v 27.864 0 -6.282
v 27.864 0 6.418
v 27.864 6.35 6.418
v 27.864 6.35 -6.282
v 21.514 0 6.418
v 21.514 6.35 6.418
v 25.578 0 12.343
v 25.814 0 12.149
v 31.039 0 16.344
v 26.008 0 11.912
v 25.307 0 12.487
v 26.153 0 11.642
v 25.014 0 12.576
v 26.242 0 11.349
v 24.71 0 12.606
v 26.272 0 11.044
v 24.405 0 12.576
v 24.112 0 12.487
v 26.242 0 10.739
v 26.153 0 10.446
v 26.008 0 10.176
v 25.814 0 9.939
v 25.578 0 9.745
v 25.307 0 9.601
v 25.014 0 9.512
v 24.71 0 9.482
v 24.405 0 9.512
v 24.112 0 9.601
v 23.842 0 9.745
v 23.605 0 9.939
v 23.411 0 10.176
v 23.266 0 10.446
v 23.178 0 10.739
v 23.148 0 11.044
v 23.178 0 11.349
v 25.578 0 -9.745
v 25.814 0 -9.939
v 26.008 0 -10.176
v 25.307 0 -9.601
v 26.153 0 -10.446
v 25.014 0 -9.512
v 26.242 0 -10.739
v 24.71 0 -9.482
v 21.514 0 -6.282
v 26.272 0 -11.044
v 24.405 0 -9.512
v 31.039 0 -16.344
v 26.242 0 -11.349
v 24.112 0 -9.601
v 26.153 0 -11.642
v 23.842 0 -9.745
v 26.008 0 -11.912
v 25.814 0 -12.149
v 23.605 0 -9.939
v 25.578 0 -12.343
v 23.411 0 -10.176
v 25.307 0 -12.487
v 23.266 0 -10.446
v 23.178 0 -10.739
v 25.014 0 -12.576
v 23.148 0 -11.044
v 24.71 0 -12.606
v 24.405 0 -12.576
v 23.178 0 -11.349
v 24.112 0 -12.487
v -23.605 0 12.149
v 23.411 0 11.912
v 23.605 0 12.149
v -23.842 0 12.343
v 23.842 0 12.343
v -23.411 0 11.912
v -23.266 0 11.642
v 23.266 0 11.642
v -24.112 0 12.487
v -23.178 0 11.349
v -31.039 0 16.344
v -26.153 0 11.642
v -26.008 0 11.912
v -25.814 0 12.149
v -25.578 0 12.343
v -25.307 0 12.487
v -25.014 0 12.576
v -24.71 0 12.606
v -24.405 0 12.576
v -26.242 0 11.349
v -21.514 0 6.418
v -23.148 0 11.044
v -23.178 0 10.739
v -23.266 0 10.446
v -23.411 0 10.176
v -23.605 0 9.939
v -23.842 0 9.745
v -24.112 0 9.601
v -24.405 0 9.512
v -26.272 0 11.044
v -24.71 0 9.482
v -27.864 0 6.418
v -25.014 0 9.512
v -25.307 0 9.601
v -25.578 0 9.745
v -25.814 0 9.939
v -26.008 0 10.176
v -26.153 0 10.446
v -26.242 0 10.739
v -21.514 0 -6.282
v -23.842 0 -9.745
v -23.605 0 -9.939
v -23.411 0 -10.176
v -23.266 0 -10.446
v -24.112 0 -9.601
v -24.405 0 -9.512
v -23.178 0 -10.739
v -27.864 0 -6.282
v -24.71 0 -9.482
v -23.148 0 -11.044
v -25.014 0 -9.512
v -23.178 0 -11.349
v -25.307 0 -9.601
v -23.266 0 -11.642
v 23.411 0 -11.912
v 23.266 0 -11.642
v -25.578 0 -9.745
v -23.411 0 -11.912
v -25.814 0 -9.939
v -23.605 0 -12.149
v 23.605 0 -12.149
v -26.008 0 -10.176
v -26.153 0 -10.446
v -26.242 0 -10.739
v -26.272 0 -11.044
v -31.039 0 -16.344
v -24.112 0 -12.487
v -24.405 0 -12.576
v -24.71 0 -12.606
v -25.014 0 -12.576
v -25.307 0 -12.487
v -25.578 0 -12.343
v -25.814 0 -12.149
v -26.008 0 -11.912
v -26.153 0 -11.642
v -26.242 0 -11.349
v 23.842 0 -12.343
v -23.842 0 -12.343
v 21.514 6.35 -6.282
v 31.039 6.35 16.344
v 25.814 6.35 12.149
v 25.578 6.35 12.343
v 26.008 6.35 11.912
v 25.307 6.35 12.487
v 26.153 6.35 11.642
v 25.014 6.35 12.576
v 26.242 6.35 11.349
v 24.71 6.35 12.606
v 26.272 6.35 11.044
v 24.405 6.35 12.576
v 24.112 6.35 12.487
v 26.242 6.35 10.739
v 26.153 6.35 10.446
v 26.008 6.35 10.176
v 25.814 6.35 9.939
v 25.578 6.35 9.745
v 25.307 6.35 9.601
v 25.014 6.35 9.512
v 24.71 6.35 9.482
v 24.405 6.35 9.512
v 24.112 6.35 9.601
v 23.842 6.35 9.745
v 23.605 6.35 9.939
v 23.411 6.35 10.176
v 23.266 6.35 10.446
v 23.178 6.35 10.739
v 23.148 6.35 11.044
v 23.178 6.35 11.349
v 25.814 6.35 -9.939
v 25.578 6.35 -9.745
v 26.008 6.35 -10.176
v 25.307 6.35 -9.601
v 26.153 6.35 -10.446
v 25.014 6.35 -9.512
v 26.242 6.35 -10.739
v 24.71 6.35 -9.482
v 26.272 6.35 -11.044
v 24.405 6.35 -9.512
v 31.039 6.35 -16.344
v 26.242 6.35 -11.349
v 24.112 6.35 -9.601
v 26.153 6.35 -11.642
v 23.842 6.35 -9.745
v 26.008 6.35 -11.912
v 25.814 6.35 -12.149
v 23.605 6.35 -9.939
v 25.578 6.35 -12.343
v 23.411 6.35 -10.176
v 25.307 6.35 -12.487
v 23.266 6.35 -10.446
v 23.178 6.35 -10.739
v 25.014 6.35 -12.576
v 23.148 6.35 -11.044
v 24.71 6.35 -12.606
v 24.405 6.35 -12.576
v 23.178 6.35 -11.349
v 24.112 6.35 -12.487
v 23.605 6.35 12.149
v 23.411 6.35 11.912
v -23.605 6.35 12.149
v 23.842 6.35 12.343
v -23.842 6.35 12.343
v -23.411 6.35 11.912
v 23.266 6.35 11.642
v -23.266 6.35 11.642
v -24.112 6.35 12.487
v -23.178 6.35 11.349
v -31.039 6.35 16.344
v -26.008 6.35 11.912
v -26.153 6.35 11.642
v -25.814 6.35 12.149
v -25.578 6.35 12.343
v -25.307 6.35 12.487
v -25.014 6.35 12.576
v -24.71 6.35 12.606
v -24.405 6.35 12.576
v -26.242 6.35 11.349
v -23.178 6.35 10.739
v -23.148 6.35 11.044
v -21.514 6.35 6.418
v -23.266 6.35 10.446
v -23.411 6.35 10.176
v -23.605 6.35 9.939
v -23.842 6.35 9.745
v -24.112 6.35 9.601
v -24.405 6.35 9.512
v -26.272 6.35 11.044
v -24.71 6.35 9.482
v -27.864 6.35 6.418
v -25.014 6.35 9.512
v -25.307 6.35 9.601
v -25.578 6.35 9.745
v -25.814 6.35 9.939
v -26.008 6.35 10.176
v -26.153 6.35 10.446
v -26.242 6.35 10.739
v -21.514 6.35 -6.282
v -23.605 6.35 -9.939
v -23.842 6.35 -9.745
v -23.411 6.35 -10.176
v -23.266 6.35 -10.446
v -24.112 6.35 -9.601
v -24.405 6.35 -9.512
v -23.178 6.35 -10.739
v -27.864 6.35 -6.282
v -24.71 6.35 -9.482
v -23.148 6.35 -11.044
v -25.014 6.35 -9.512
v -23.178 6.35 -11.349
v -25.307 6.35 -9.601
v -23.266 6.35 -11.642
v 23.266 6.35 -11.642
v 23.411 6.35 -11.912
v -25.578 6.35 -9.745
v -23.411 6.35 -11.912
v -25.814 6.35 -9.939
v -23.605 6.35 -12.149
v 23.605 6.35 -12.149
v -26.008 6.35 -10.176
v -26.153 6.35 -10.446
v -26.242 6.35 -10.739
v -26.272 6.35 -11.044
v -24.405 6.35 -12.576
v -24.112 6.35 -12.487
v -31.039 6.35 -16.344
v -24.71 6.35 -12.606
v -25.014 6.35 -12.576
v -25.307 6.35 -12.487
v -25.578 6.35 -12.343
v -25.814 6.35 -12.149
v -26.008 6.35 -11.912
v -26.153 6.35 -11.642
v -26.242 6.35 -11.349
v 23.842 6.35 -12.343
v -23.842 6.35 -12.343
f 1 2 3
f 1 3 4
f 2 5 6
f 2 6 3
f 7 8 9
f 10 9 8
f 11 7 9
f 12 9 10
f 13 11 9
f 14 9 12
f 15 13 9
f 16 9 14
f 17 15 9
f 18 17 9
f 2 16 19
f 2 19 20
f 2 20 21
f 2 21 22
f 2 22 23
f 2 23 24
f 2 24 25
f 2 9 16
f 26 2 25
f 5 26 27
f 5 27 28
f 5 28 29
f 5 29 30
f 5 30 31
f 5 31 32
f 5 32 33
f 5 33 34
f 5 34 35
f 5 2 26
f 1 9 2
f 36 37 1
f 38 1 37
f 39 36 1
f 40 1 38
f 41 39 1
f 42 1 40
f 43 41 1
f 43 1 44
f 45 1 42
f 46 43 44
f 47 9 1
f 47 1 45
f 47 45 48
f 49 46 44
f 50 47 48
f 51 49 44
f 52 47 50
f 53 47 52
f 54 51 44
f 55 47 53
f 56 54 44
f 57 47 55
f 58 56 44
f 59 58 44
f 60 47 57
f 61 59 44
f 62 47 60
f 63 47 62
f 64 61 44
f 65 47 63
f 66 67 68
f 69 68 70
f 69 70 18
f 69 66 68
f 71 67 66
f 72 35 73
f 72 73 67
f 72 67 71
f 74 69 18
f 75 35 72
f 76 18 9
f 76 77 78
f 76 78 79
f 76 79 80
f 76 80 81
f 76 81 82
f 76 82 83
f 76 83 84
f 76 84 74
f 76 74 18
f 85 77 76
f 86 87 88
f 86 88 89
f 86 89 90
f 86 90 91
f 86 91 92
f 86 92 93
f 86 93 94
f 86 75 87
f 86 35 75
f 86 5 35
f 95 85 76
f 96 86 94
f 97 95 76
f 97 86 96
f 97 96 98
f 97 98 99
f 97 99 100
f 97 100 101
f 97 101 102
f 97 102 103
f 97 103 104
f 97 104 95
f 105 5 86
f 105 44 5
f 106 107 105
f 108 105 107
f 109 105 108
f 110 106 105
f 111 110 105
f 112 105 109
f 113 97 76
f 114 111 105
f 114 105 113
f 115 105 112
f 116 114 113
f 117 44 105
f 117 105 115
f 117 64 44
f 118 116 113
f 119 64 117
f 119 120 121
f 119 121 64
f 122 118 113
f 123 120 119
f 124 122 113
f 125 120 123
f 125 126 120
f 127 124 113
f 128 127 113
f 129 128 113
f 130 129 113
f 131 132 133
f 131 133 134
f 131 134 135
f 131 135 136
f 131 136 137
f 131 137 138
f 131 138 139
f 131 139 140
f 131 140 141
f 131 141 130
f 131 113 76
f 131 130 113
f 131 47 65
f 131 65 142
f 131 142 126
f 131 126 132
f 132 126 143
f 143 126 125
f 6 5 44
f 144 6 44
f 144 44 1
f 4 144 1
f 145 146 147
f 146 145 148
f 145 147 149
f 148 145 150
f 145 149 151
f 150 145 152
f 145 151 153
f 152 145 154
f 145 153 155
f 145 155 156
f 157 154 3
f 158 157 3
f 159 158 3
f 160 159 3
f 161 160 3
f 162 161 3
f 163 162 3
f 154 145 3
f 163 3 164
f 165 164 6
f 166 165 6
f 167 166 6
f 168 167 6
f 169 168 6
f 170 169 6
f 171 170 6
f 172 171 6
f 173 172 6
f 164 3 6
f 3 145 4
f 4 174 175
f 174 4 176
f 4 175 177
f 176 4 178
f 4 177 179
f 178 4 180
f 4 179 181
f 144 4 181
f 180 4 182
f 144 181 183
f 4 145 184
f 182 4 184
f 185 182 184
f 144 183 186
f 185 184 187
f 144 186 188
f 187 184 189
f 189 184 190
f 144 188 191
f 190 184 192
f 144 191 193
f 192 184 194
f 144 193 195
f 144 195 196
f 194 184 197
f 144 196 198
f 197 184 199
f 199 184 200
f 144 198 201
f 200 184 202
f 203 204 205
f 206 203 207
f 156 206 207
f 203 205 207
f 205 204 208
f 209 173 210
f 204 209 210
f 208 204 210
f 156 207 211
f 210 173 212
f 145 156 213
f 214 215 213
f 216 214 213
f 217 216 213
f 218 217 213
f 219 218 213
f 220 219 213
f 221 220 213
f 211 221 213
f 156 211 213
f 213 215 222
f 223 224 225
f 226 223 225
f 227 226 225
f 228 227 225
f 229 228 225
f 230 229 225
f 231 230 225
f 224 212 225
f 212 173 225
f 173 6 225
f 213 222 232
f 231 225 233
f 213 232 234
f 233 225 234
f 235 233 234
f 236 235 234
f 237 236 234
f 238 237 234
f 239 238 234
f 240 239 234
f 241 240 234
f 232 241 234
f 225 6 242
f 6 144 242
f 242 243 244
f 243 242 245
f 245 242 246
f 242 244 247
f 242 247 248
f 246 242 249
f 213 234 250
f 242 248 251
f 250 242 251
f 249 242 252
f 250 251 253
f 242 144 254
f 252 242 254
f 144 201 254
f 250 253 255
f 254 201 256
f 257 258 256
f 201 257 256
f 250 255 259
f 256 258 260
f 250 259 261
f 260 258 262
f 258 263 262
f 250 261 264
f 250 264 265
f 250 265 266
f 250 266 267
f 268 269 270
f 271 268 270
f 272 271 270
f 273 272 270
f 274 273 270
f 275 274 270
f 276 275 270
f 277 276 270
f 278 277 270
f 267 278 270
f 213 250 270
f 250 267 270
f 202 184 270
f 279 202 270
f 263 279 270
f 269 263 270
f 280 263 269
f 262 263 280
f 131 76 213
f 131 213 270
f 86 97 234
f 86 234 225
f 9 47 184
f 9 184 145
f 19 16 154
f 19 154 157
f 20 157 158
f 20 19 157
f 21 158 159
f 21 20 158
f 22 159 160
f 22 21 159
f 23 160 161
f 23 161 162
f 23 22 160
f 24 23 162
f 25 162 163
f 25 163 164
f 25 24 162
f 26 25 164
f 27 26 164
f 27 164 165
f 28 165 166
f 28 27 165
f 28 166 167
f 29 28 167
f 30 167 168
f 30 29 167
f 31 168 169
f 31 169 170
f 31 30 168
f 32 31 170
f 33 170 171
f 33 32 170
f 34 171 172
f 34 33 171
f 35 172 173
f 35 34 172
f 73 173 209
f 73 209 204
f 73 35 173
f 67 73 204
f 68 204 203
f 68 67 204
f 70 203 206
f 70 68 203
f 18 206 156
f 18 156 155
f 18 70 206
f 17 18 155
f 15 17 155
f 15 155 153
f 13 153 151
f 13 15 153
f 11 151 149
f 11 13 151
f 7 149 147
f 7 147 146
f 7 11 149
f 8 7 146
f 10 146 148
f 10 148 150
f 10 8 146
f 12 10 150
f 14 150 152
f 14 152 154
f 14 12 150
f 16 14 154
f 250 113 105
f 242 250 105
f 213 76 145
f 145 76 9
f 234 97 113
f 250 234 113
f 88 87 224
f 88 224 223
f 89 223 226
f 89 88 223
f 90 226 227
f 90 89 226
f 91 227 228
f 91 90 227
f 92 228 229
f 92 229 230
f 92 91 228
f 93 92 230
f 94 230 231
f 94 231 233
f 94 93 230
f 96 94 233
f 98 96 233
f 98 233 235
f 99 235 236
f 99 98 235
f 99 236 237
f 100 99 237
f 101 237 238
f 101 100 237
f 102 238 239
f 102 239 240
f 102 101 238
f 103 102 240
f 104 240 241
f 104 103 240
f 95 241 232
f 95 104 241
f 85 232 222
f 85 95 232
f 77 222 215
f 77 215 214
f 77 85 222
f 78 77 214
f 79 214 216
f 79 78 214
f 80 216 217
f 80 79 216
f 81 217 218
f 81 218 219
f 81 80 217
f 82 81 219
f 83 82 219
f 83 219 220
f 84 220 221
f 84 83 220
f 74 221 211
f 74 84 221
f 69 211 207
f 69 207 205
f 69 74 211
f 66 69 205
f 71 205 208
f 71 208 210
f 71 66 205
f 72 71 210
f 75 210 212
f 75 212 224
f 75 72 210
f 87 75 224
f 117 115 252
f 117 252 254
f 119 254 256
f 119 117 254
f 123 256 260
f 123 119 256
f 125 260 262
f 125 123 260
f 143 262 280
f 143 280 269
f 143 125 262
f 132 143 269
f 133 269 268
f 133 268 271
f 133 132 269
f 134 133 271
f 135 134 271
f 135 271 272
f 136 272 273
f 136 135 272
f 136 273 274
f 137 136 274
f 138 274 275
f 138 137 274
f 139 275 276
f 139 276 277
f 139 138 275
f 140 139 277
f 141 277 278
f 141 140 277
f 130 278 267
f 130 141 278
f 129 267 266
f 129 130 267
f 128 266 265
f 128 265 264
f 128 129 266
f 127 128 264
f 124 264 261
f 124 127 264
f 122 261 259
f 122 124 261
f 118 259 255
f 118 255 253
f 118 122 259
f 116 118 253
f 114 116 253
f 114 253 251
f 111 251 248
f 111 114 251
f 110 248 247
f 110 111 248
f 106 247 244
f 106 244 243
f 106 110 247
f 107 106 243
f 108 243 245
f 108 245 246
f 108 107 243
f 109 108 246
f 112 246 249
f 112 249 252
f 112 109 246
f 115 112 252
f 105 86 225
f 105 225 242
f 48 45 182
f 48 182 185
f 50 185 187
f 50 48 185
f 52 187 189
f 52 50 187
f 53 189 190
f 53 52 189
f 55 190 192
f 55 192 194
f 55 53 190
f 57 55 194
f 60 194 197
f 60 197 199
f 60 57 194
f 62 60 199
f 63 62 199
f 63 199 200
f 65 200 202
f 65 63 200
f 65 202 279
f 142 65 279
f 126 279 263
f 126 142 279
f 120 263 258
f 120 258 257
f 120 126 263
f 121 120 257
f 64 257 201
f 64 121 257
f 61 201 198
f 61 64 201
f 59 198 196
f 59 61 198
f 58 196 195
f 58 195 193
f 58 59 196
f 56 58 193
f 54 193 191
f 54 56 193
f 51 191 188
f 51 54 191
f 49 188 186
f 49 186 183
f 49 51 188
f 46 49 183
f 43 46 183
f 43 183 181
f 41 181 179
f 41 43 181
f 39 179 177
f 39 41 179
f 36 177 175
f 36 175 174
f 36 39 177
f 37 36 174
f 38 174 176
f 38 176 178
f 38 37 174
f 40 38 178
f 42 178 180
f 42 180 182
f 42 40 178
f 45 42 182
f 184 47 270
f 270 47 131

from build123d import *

# Parameters (mm, degrees)
SKETCH1_R           = 1.5621
SKETCH1_W           = 6.35
SKETCH1_H           = 12.7
BOSS_EXTRUDE1_DEPTH = 6.35


with BuildPart() as part:
    # Sketch1 → Boss-Extrude1 (new body)
    with BuildSketch(Plane(origin=(0, 0, 0), x_dir=(1, 0, 0), z_dir=(0, 1, 0))):
        Polygon((-29.684698321, 16.343647987), (29.684698321, 16.343647987), (31.0388, 16.343647987), (31.0388, -16.343647987), (29.684698321, -16.343647987), (-29.684698321, -16.343647987), (-31.0388, -16.343647987), (-31.0388, 16.343647987), align=None)
        with Locations((-24.709647151, 11.044056729)):
            Circle(SKETCH1_R, mode=Mode.SUBTRACT)
        with Locations((-24.709647151, -11.044056729)):
            Circle(SKETCH1_R, mode=Mode.SUBTRACT)
        with Locations((24.709647151, 11.044056729)):
            Circle(SKETCH1_R, mode=Mode.SUBTRACT)
        with Locations((24.709647151, -11.044056729)):
            Circle(SKETCH1_R, mode=Mode.SUBTRACT)
        with Locations((24.6888, -0.068443271)):
            Rectangle(SKETCH1_W, SKETCH1_H, mode=Mode.SUBTRACT)
        with Locations((-24.6888, -0.068443271)):
            Rectangle(SKETCH1_W, SKETCH1_H, mode=Mode.SUBTRACT)
    extrude(amount=BOSS_EXTRUDE1_DEPTH)


solid = part.part
